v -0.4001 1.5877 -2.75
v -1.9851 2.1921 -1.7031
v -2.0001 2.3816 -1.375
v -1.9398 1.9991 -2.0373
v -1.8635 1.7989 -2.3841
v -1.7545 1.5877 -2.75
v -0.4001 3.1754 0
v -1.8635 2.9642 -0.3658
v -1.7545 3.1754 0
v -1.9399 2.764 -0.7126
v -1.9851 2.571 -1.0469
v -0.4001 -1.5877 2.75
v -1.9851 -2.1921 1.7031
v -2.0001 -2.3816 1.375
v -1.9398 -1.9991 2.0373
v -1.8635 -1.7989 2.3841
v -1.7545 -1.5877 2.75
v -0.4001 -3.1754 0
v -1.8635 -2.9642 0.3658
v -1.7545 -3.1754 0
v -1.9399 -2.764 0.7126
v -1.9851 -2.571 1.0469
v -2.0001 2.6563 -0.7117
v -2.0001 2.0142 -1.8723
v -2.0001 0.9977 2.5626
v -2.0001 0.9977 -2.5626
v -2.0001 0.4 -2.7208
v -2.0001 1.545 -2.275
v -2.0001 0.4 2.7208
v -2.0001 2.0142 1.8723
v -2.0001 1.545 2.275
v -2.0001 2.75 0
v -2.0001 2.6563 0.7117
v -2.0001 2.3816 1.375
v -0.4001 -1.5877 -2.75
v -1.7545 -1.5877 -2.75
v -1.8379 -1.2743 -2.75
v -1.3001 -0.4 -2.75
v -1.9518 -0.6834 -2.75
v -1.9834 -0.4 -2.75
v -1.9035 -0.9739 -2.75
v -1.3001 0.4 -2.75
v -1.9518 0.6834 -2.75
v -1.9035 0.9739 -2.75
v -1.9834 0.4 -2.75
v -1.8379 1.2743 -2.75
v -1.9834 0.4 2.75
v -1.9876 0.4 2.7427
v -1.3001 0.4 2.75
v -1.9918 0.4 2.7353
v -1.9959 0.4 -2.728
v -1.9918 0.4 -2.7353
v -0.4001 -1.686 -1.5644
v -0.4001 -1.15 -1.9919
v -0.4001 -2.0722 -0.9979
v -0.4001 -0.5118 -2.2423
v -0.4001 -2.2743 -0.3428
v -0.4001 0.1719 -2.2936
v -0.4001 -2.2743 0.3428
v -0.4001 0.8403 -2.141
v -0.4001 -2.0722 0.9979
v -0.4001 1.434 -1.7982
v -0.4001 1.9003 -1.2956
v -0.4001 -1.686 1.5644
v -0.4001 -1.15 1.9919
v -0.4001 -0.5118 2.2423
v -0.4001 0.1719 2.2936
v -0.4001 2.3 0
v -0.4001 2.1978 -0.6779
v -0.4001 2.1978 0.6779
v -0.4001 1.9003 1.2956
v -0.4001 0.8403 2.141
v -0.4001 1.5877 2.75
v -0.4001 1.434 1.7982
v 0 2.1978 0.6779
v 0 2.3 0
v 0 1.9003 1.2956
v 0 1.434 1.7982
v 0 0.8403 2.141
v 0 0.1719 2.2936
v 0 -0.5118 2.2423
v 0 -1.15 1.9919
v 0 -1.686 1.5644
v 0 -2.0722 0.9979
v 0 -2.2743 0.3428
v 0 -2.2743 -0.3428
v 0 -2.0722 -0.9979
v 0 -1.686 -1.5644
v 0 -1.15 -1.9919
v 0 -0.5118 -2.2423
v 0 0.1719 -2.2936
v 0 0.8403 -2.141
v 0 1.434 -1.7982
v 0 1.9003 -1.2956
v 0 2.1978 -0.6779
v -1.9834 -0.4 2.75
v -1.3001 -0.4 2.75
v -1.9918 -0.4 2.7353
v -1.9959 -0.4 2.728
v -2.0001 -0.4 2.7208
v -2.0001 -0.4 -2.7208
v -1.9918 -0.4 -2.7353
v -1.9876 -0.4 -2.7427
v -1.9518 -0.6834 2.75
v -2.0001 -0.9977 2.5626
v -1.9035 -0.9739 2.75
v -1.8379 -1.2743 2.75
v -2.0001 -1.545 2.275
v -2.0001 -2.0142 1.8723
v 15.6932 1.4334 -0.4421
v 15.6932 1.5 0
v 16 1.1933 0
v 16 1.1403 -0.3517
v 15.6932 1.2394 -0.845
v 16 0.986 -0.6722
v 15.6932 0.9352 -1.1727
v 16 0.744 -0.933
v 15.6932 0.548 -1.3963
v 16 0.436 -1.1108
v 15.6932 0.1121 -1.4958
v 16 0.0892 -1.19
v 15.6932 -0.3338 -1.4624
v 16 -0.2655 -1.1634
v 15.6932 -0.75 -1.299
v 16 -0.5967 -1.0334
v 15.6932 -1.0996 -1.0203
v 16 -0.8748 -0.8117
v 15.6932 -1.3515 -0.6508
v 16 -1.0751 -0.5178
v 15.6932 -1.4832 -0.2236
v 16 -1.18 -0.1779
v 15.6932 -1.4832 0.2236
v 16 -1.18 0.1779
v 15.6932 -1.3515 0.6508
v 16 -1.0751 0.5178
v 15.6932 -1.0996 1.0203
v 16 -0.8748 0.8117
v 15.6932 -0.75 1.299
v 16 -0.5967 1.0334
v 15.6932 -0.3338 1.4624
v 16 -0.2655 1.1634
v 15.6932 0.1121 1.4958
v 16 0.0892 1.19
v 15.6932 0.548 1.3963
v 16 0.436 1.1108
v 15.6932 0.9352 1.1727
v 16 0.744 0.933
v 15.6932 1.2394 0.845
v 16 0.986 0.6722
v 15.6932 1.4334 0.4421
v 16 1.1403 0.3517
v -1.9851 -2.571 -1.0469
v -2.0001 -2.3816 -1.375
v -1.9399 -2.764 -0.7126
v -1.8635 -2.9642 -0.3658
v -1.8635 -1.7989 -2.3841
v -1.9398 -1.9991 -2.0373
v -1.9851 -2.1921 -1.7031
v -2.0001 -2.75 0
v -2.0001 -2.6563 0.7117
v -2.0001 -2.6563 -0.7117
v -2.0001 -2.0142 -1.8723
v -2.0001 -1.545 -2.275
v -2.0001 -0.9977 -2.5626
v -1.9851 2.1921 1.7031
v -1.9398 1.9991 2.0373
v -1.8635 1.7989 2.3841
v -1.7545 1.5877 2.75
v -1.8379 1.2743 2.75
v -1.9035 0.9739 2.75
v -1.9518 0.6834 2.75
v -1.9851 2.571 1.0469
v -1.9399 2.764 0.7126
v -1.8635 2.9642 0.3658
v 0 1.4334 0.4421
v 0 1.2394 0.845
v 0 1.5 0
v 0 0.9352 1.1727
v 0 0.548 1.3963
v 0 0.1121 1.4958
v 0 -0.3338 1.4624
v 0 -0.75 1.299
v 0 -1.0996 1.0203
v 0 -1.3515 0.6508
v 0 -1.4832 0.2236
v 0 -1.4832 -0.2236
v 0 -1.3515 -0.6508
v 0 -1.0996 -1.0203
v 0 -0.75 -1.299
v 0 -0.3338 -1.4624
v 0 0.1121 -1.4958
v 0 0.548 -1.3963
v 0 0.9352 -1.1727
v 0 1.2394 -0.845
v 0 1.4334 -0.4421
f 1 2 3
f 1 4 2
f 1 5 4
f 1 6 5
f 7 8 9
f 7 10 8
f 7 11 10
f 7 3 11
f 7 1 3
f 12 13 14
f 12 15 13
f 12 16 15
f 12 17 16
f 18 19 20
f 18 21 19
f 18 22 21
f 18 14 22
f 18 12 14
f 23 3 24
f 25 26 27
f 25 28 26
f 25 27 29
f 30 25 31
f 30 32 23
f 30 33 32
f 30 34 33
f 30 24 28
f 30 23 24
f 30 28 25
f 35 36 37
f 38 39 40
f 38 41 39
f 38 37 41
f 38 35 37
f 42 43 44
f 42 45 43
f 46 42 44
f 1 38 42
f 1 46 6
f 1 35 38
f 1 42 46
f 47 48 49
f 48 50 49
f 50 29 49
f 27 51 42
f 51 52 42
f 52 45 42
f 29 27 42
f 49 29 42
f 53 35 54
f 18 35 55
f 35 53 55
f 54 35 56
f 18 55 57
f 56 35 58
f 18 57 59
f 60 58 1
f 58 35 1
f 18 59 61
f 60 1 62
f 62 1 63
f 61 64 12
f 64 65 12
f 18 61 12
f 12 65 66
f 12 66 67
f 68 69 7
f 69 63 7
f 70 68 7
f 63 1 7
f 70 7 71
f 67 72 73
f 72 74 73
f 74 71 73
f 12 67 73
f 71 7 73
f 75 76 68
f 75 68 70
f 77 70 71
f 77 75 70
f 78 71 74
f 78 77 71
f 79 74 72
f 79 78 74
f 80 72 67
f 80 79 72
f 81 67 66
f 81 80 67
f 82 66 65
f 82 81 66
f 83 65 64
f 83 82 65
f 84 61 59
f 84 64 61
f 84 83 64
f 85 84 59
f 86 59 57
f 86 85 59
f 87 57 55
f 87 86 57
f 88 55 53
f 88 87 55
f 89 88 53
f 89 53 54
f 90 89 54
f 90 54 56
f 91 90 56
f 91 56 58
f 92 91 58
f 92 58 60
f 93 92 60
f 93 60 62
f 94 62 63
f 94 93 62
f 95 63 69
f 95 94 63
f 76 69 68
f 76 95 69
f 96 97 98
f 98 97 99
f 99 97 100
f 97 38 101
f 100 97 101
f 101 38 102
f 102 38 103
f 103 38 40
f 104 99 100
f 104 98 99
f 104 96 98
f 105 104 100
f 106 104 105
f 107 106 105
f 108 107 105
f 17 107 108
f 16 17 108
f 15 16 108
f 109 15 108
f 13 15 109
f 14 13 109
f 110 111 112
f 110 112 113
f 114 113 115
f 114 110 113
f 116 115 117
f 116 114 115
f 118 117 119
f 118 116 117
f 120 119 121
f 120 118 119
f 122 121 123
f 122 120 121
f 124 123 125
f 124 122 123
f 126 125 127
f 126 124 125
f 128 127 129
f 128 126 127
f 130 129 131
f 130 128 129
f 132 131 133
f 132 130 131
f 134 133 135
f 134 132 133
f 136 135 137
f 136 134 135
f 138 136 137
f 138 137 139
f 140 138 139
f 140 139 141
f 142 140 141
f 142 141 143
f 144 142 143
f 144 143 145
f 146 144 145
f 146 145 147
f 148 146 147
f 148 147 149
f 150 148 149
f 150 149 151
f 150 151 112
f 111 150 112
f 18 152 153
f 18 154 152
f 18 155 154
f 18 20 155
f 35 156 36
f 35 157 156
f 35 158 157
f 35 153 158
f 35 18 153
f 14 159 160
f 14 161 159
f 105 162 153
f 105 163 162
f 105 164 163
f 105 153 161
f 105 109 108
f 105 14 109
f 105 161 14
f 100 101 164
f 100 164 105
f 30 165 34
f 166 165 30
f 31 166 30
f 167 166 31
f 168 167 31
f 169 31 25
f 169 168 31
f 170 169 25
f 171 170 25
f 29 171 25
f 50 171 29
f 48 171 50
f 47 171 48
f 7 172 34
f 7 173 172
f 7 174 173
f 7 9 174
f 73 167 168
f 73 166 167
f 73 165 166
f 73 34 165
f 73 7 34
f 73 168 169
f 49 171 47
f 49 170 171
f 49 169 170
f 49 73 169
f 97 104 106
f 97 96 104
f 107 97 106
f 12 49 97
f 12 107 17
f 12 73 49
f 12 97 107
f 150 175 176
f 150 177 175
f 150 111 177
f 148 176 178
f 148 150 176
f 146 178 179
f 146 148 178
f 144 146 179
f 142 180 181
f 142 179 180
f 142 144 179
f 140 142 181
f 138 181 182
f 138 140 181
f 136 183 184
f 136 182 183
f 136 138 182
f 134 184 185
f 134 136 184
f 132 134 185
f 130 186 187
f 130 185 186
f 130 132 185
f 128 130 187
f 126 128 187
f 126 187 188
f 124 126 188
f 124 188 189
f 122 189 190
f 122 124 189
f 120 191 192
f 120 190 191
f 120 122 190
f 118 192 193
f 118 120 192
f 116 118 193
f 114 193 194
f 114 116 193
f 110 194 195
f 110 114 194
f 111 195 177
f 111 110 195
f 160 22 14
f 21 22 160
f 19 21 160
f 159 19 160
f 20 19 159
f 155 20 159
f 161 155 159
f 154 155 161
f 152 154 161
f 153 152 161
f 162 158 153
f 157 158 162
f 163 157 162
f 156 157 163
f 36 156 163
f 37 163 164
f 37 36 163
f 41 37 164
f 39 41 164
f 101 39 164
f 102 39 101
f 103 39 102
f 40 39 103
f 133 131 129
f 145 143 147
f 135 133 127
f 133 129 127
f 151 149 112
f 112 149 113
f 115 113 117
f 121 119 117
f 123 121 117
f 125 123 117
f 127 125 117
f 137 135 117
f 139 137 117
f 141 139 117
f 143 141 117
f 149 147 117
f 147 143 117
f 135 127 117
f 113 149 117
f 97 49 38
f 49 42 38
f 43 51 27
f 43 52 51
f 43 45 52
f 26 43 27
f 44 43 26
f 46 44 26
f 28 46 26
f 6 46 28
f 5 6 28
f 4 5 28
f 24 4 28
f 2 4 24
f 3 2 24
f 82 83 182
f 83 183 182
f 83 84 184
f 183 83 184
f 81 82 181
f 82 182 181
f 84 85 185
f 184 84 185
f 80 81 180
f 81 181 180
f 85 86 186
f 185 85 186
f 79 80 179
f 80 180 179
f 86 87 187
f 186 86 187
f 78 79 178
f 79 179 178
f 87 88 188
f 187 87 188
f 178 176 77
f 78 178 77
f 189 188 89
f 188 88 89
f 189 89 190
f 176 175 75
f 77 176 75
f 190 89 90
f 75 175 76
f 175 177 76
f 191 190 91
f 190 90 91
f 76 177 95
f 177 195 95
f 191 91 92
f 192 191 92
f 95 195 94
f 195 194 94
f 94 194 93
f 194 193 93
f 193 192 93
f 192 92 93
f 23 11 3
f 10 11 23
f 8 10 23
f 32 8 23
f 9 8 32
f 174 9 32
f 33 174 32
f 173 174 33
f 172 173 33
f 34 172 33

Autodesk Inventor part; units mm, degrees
ref_plane "YZ Plane" through (0, 0, 0) normal (1, 0, 0) x (0, 1, 0)
ref_plane "XZ Plane" through (0, 0, 0) normal (0, 1, 0) x (-1, 0, 0)
sketch "Sketch1" plane through (0, 0, 0) normal (0, 0, 1) x (1, 0, 0)
  line L0 (0, 2.3) -> (0, 1.5)
  line L1 (0, 1.5) -> (16, 1.5)
  line L2 (16, 1.5) -> (16, 0)
  line L3 (16, 0) -> (-0.4001, 0)
  line L4 (-3.6801, 0) -> (19.28, 0) projected
  line L5 (-0.4001, 0) -> (-0.4001, 2.3)
  line L6 (-0.4001, 2.3) -> (0, 2.3)
  line L7 (0, -0.46) -> (0, 2.76) projected
  dimension "d0" = 16
  dimension "d1" = 3
  dimension "d8" = 0.4001
  dimension "d9" = 4.6
revolve "Body" add sketch "Sketch1" angle 360 about axis through (16, 0, 0) along (-1, 0, 0)
sketch "Sketch2" plane through (-0.4001, 0, 0) normal (-1, 0, 0) x (0, 0, 1)
  line L0 (0, 3.1754) -> (2.75, 1.5877)
  line L1 (2.75, 1.5877) -> (2.75, -1.5877)
  line L2 (2.75, -1.5877) -> (0, -3.1754)
  line L3 (0, -3.1754) -> (-2.75, -1.5877)
  line L4 (-2.75, -1.5877) -> (-2.75, 1.5877)
  line L5 (-2.75, 1.5877) -> (0, 3.1754)
  point P0 (0, 0)
  point P1 (0, 0)
  dimension "d10" = 5.5
extrude "Head" add sketch "Sketch2" along normal blind 1.6
sketch "Sketch3" plane through (0, 0, 0) normal (0, 0, 1) x (1, 0, 0)
  line L0 (-2.0001, 0.4) -> (-1.3001, 0.4)
  line L1 (-1.3001, 0.4) -> (-1.3001, -0.4)
  line L2 (-1.3001, -0.4) -> (-2.0001, -0.4)
  line L3 (-2.0001, -0.4) -> (-2.0001, 0.4)
  line L4 (-1.3001, 0) -> (-2.0001, 0) construction
  line L5 (-2.1401, 0) -> (-1.1601, 0) projected
  line L6 (-2.0001, 1.5877) -> (-2.0001, -1.5877) projected
  dimension "d11" = 0.8
  dimension "d13" = 0.7
extrude "Slot" cut sketch "Sketch3" along normal through all both and the other way through all
sketch "Sketch4" plane through (0, 0, 0) normal (0, 0, 1) x (1, 0, 0)
  line L0 (-2.0001, 2.75) -> (-2.0001, 3.1754)
  line L1 (-2.0001, 3.1754) -> (-1.7545, 3.1754)
  line L2 (-1.7545, 3.1754) -> (-2.0001, 2.75)
  line L3 (-1.7545, 3.1754) -> (-2.0001, 3.1754)
  line L4 (-2.0001, 3.1754) -> (-2.0001, 2.75)
  line L5 (-2.0001, 3.1754) -> (-2.0001, 1.5877) projected
  line L6 (-2.3201, 0) -> (-0.0801, 0) projected
  line L7 (-0.4001, 3.1754) -> (-2.0001, 3.1754) projected
  dimension "d4" = 30
  dimension "d17" = 5.5
revolve "Chamfer1" cut sketch "Sketch4" angle 360 about axis through (-10, 0, 0) along (1, 0, 0)
thread "Thread" size "M3x0.5" designation "M3" class "6g" standard "GB Metric profile" length 15.5
chamfer "Chamfer2" distance 0.3067 distance2 0.3068 1 edges at (16, -1.5, 0) measured on face at (16, -0.3888, -0.2119)
ref_plane "Work Plane1" through (60, 0, 0) normal (0, 0, 1) x (1, 0, 0)
equation "\"d0\" = NLG"
equation "\"d1\" = GD"
equation "\"d9\" = SD2"
equation "\"d10\" = SW"
equation "\"d2\" = KOH - SD"
equation "\"d11\" = SBR"
equation "\"d13\" = STI"
equation "\"d4\" = ANG1"
equation "\"d17\" = SW0"
equation "\"d15\" = GEL"
equation "\"d5\" = -0.5 * SPD + 0.5 * GD"
equation "\"NLG\" = 16"
equation "\"GD\" = NND"
equation "\"KOH\" = 2"
equation "\"GEL\" = 15.5"
equation "\"SW\" = 5.5"
equation "\"SW0\" = SW"
equation "\"SPD\" = NND - 1.2269 * PTC"
equation "\"SD2\" = SDH"
equation "\"SD\" = WFT"
equation "\"ANG1\" = 30deg"
equation "\"GUL\" = 0.61345 * PTC"
equation "\"STI\" = 0.7"
equation "\"SBR\" = 0.8"
equation "\"RR\" = 0.1"
equation "\"GAL\" = 0.61345 * PTC"
equation "\"BDM\" = NND"
equation "\"WFT\" = 0.4"
equation "\"FAWI\" = 45deg"
equation "\"PTC\" = 0.5"
equation "\"THREADDIA\" = 3"
equation "\"E0\" = 1.155 * SW"
equation "\"TOA\" = 30deg"
equation "\"NND\" = 3"
equation "\"GD1\" = THREADDIA - 1.2269 * PTC"
equation "\"SDH\" = 4.6"
properties part number "Bolt GB 29.1 M3 x 16" material "Acero, suave"
